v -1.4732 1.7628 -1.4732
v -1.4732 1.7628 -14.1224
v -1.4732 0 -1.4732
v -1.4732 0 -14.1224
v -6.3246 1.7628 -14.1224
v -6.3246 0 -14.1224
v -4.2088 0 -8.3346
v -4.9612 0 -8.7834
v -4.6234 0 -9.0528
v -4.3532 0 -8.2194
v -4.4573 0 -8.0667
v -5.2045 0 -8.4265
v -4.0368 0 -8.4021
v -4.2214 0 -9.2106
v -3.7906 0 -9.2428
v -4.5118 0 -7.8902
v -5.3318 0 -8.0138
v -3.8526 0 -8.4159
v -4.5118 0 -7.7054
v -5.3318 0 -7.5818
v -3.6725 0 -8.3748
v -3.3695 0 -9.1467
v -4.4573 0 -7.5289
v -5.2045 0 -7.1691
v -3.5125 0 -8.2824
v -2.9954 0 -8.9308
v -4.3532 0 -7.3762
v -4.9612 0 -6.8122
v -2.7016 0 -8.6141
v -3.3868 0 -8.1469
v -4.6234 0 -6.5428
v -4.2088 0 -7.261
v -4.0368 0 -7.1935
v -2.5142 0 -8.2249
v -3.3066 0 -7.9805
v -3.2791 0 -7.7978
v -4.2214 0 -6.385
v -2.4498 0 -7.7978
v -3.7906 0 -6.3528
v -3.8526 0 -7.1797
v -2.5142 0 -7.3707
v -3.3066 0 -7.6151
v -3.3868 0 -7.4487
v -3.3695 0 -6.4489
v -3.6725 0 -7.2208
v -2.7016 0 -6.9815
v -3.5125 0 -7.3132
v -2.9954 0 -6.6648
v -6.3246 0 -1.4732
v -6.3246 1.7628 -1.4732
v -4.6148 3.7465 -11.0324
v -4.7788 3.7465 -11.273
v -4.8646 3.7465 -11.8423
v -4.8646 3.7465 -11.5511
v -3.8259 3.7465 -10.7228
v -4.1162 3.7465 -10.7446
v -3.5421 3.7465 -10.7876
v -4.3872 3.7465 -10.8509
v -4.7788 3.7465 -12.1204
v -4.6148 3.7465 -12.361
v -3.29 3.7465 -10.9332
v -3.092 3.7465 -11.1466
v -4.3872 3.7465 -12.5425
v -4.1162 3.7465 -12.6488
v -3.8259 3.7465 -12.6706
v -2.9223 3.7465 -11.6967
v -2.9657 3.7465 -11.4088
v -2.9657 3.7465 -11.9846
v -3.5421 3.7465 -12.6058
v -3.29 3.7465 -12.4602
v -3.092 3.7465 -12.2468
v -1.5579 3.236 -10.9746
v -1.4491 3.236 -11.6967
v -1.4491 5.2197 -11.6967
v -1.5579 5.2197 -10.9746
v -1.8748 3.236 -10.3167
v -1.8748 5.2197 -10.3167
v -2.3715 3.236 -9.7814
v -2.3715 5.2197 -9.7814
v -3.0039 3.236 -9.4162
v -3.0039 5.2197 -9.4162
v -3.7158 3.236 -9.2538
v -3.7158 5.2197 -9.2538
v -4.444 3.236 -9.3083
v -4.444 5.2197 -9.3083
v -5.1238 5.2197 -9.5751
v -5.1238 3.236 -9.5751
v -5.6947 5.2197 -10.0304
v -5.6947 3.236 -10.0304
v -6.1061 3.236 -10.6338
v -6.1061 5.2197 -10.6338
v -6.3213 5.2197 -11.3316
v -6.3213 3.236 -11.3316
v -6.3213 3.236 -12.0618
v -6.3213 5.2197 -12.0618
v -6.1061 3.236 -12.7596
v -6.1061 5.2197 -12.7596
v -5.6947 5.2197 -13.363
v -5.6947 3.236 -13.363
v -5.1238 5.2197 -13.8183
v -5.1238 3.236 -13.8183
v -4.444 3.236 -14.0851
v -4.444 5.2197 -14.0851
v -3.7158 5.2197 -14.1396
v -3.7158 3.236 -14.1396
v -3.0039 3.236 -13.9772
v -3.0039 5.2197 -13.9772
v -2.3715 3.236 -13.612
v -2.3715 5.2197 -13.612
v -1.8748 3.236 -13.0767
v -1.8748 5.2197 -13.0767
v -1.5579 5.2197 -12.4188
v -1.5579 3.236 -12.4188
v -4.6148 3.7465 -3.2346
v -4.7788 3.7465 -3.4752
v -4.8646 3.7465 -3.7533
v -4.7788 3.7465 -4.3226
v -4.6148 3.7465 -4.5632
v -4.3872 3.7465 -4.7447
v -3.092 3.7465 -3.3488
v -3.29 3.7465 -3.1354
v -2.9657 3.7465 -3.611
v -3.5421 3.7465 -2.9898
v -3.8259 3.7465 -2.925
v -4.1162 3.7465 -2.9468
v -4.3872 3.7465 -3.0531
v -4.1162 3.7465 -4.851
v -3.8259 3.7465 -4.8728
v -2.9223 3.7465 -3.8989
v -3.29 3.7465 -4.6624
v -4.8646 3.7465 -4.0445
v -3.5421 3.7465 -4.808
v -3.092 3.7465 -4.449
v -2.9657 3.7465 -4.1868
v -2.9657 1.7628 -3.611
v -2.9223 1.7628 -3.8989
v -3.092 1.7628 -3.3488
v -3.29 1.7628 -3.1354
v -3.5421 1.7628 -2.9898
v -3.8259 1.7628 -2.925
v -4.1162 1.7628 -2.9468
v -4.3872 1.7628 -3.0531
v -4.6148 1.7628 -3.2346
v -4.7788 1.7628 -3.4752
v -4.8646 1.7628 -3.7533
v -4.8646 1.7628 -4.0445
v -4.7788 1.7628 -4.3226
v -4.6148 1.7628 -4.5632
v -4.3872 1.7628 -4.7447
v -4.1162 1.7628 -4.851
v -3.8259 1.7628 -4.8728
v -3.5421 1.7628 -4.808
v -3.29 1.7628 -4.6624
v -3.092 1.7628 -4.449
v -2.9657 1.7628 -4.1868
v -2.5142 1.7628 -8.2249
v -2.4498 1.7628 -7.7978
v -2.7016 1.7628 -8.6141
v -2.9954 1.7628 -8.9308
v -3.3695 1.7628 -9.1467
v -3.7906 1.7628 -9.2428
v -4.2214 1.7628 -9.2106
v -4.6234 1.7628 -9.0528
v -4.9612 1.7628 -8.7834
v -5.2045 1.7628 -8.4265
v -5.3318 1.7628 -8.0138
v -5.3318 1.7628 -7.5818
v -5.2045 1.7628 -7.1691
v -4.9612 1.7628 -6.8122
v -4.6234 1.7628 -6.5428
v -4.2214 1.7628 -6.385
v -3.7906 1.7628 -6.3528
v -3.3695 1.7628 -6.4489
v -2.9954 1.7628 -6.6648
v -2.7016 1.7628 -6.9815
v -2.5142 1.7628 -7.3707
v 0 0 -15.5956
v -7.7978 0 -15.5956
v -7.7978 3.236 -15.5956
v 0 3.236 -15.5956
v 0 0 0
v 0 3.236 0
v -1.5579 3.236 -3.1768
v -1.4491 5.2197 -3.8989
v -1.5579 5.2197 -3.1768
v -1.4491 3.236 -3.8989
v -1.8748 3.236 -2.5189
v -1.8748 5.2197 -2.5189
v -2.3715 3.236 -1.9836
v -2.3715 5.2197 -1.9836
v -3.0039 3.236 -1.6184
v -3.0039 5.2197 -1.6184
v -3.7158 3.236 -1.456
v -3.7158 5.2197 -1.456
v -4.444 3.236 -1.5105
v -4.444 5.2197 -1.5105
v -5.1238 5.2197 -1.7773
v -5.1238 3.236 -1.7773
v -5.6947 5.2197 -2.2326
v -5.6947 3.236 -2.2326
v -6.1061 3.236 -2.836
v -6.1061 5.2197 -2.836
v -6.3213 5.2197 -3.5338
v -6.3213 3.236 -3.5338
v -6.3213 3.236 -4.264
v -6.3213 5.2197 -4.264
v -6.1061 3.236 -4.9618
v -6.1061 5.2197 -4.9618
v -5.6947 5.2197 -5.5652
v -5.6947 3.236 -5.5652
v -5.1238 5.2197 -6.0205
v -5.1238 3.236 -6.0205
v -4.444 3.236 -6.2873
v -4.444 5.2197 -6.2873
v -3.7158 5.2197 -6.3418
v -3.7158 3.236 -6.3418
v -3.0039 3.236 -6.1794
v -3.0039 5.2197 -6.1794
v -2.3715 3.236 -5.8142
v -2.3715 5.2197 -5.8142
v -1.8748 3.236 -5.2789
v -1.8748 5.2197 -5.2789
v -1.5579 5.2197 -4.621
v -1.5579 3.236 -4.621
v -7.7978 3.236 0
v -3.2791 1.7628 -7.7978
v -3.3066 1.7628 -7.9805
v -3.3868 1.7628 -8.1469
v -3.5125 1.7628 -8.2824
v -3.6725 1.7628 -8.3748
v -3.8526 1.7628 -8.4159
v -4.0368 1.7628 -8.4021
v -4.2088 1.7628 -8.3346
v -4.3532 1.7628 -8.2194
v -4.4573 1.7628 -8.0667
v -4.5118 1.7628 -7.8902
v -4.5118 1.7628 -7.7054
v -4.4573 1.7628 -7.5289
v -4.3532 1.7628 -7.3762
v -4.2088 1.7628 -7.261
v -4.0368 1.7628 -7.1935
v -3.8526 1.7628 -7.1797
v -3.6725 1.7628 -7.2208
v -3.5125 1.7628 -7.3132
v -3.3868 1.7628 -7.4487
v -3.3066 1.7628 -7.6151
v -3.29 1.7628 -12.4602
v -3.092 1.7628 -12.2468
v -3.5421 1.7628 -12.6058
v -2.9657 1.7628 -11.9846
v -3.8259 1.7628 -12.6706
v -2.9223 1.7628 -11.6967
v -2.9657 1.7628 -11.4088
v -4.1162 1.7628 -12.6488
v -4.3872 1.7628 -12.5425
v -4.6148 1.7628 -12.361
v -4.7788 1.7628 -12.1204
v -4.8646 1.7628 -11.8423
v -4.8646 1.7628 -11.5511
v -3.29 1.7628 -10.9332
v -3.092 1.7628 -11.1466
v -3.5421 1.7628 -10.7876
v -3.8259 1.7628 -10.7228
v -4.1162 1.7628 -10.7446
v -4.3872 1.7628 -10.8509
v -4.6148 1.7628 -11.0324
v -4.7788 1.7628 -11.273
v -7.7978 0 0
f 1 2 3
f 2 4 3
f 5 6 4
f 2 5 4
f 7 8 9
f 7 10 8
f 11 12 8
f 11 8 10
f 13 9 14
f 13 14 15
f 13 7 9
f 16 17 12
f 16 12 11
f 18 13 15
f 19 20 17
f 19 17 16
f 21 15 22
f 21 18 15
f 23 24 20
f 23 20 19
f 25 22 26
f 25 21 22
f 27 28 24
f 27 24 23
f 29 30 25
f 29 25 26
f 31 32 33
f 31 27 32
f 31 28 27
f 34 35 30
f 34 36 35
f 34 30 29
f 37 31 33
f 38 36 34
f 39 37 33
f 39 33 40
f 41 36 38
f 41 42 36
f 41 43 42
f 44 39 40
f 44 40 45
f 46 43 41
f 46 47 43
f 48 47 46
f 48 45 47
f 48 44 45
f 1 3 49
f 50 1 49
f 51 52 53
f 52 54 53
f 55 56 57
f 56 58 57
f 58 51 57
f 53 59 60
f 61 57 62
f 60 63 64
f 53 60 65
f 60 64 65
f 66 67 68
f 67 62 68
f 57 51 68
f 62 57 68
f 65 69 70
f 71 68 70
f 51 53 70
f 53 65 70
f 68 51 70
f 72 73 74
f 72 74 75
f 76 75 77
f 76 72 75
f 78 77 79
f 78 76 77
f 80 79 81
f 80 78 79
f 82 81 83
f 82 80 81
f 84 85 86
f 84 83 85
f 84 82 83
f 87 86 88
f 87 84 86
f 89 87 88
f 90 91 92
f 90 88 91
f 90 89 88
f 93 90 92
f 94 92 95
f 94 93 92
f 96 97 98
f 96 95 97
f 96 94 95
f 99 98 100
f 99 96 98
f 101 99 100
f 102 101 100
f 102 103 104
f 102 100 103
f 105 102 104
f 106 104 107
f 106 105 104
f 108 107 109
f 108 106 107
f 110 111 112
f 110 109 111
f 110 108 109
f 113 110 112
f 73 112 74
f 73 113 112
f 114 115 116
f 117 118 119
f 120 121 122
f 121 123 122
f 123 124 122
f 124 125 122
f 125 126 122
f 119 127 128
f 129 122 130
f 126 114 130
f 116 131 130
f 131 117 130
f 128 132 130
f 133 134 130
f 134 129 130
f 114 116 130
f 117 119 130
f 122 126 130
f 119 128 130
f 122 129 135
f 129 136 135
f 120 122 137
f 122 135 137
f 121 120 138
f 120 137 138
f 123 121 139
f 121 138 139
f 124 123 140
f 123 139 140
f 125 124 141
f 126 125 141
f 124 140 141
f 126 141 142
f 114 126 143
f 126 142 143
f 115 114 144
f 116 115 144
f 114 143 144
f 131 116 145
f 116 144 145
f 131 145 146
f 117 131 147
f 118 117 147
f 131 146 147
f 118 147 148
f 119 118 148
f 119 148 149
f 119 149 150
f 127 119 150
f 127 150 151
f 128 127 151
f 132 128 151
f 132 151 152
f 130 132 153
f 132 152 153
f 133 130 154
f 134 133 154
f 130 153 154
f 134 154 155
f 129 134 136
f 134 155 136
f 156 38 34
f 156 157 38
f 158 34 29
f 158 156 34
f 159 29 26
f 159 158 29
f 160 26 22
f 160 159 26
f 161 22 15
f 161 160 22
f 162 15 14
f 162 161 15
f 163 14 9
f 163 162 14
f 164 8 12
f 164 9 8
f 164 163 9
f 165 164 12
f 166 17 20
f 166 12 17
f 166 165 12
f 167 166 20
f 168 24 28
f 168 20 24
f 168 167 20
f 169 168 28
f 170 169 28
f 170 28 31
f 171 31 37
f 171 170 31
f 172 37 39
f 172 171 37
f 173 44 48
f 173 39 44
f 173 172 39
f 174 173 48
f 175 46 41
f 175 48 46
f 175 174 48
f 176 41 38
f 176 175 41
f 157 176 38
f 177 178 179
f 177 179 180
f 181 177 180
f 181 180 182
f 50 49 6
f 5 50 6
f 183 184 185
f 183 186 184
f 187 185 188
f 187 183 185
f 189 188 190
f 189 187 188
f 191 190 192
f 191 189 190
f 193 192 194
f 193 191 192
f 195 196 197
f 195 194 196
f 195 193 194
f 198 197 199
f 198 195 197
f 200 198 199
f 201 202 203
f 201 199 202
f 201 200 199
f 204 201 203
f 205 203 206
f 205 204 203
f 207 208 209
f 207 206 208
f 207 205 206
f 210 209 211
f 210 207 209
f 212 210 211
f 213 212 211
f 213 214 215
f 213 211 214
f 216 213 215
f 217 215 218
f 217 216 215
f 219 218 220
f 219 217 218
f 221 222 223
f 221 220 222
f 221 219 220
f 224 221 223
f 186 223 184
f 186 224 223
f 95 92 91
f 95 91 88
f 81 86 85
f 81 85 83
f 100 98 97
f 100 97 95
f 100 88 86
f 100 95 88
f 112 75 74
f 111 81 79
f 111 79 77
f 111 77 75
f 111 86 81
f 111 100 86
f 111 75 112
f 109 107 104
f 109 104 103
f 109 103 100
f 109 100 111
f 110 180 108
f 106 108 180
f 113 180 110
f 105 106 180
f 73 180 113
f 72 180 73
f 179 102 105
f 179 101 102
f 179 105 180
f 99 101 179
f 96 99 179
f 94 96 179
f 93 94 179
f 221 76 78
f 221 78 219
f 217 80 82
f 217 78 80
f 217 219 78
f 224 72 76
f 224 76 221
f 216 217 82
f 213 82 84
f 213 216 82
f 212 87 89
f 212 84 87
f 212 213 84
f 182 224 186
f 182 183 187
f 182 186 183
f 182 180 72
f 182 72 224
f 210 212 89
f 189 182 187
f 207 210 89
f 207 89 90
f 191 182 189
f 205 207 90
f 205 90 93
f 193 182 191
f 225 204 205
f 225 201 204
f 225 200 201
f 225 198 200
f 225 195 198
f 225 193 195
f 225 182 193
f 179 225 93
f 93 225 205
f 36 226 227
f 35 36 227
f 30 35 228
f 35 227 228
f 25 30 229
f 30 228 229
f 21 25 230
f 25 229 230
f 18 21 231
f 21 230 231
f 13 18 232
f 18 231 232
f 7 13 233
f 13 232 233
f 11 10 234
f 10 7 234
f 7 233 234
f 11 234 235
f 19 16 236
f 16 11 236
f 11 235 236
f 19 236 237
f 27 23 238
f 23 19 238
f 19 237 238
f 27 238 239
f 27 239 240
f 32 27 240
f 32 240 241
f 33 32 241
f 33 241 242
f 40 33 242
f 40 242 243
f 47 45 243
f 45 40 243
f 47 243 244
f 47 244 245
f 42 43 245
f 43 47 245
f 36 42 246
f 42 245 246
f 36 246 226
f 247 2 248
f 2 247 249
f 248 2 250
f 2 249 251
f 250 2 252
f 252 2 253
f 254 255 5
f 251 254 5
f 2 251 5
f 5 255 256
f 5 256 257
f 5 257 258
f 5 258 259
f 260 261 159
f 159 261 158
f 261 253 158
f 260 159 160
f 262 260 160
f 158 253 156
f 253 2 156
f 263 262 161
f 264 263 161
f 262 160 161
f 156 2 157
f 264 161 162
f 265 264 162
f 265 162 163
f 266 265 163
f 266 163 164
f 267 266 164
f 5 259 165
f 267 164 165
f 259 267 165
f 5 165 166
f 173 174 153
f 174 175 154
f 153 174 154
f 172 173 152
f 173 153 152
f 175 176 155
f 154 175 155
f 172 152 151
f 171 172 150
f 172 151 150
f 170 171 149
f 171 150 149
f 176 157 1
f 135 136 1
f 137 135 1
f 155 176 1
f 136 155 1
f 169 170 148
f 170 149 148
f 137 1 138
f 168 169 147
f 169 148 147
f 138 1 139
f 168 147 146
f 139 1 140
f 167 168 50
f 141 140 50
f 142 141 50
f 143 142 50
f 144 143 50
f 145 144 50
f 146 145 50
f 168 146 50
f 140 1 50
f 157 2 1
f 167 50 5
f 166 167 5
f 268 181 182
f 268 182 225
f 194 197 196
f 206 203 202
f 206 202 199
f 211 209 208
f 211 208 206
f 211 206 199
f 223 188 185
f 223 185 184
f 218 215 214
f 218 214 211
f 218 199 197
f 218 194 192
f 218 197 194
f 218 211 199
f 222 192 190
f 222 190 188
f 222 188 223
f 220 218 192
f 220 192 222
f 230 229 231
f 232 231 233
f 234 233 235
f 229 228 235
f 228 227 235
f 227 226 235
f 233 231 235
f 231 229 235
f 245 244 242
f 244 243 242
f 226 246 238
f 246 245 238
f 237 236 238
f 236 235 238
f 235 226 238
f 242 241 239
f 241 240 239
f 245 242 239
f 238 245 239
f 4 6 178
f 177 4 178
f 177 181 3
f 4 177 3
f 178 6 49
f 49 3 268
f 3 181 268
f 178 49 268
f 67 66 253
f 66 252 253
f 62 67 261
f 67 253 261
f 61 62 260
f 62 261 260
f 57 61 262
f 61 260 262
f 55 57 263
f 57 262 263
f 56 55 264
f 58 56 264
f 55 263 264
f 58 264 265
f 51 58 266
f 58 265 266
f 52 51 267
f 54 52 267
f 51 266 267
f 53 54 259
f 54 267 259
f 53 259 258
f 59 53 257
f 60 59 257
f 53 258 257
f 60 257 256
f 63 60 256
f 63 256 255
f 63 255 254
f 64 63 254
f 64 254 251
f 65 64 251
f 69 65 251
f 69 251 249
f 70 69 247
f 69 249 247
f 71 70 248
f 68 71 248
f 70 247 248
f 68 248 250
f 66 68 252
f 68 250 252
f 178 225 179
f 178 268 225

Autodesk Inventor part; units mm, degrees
ref_plane "YZ Plane" through (0, 0, 0) normal (1, 0, 0) x (0, 1, 0)
ref_plane "XZ Plane" through (0, 0, 0) normal (0, 1, 0) x (-1, 0, 0)
ref_plane "XY Plane" through (0, 0, 0) normal (0, 0, 1) x (1, 0, 0)
sketch "Sketch1" plane through (0, 0, 0) normal (0, 1, 0) x (-1, 0, 0)
  line L0 (0, 0) -> (7.7978, 0)
  line L1 (7.7978, 0) -> (7.7978, -15.5956)
  line L2 (7.7978, -15.5956) -> (0, -15.5956)
  line L3 (0, -15.5956) -> (0, 0)
  dimension "d0" = 7.7978
  dimension "d1" = 15.5956
extrude "Extrusion1" add sketch "Sketch1" along normal blind 3.236
sketch "Sketch2" plane through (0, 3.236, 0) normal (0, 1, 0) x (1, 0, 0)
  line L0 (0, 0) -> (-3.8989, 0) construction
  line L1 (-3.8989, 0) -> (-3.8989, 3.8989) construction
  line L2 (-3.8989, 3.8989) -> (0, 3.8989) construction
  line L3 (0, 3.8989) -> (0, 0) construction
  circle A0 centre (-3.8989, 3.8989) radius 2.4498
  dimension "d4" = 3.8989
  dimension "d5" = 3.8989
  dimension "d6" = 4.8997
extrude "Extrusion2" add sketch "Sketch2" along normal blind 1.9837
pattern_linear "Rectangular Pattern1" count 2 spacing 7.7978 along (0, 0, -1) of "Extrusion2"
shell "Shell1" thickness 1.4732 removed faces 1 at (-2.5993, 0, -5.1985)
sketch "Sketch3" plane through (-6.3246, 1.7628, -1.4732) normal (0, -1, 0) x (1, 0, 0)
  circle A0 centre (2.4257, -2.4257) radius 2.4498 construction
  circle A1 centre (2.4257, -10.2235) radius 2.4498 construction
  circle A2 centre (2.4257, -2.4257) radius 0.9766 construction
  line L0 (2.4257, -2.4257) -> (2.4257, -10.2235) construction
  circle A3 centre (2.4257, -6.3246) radius 0.6198
  circle A4 centre (2.4257, -6.3246) radius 1.4491
  point P0 (6.3246, 1.4732)
  dimension "d13" = 1.2395
extrude "Extrusion3" add sketch "Sketch3" along normal up to surface (1.7628 mm away)
properties part number "1x2 short orange pegged" material "ABS Plastic"
